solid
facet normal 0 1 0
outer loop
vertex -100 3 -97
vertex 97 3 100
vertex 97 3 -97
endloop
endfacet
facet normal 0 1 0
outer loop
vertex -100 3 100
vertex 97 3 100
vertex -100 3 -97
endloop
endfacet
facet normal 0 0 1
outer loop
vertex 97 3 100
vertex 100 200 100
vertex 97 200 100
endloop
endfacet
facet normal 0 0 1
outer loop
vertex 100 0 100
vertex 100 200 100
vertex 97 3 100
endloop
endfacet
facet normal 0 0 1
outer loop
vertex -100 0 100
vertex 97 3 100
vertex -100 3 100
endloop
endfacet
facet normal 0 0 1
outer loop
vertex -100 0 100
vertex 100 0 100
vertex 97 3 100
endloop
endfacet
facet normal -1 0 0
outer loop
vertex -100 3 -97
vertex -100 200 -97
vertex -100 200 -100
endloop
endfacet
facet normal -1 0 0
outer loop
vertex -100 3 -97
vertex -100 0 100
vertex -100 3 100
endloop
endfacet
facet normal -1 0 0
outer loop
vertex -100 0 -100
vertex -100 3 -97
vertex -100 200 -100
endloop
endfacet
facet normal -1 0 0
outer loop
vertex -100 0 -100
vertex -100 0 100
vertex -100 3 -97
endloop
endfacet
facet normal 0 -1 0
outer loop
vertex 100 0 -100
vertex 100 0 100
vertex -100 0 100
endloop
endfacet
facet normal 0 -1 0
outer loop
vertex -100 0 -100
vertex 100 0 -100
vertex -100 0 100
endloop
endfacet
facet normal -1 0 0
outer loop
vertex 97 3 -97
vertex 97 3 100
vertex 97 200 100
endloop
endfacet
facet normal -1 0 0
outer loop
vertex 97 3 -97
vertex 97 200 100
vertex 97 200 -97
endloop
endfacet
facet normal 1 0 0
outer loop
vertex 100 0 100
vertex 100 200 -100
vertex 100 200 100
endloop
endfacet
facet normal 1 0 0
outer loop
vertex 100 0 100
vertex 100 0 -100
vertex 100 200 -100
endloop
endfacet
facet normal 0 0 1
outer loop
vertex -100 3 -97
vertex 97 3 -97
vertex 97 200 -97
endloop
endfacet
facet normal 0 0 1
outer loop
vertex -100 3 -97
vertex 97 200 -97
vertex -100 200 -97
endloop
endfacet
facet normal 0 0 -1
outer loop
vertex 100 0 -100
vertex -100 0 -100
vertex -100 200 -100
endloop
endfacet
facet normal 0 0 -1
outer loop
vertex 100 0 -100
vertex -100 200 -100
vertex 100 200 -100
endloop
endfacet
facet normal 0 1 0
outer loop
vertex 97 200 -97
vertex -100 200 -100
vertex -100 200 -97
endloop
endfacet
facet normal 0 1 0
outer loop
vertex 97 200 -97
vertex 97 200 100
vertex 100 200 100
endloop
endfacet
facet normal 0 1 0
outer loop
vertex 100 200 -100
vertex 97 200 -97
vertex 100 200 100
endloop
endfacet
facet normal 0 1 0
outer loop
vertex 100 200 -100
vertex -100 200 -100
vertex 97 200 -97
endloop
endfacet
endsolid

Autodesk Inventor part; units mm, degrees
ref_plane "YZ Plane" through (0, 0, 0) normal (1, 0, 0) x (0, 1, 0)
ref_plane "XZ Plane" through (0, 0, 0) normal (0, 1, 0) x (-1, 0, 0)
ref_plane "XY Plane" through (0, 0, 0) normal (0, 0, 1) x (1, 0, 0)
sketch "Sketch1" plane through (0, 0, 0) normal (0, 1, 0) x (-1, 0, 0)
  line L0 (100, 100) -> (100, -100)
  line L1 (100, -100) -> (-100, -100)
  line L2 (-100, -100) -> (-100, 100)
  line L3 (-100, 100) -> (100, 100)
  line L4 (100, 100) -> (-100, -100) construction
  line L5 (100, -100) -> (-100, 100) construction
  point P0 (0, 0)
  dimension "d0" = 200
  dimension "d1" = 200
extrude "Extrusion1" add sketch "Sketch1" along normal blind 3
sketch "Sketch3" plane through (0, 3, 0) normal (0, 1, 0) x (1, 0, 0)
  line L0 (100, -100) -> (100, 100) projected
  line L1 (100, 100) -> (100, -100)
  line L2 (100, -100) -> (97, -100)
  line L3 (97, -100) -> (97, 100)
  line L4 (97, 100) -> (100, 100)
  dimension "d4" = 3
extrude "Extrusion2" add sketch "Sketch3" along normal blind 197
sketch "Sketch4" plane through (0, 3, 0) normal (0, 1, 0) x (1, 0, 0)
  line L0 (-100, 100) -> (97, 100)
  line L1 (97, 100) -> (97, 97)
  line L2 (97, 97) -> (-100, 97)
  line L3 (-100, 97) -> (-100, 100)
  dimension "d7" = 3
extrude "Extrusion3" add sketch "Sketch4" along normal blind 197
properties part number "Chassis Constraints"
